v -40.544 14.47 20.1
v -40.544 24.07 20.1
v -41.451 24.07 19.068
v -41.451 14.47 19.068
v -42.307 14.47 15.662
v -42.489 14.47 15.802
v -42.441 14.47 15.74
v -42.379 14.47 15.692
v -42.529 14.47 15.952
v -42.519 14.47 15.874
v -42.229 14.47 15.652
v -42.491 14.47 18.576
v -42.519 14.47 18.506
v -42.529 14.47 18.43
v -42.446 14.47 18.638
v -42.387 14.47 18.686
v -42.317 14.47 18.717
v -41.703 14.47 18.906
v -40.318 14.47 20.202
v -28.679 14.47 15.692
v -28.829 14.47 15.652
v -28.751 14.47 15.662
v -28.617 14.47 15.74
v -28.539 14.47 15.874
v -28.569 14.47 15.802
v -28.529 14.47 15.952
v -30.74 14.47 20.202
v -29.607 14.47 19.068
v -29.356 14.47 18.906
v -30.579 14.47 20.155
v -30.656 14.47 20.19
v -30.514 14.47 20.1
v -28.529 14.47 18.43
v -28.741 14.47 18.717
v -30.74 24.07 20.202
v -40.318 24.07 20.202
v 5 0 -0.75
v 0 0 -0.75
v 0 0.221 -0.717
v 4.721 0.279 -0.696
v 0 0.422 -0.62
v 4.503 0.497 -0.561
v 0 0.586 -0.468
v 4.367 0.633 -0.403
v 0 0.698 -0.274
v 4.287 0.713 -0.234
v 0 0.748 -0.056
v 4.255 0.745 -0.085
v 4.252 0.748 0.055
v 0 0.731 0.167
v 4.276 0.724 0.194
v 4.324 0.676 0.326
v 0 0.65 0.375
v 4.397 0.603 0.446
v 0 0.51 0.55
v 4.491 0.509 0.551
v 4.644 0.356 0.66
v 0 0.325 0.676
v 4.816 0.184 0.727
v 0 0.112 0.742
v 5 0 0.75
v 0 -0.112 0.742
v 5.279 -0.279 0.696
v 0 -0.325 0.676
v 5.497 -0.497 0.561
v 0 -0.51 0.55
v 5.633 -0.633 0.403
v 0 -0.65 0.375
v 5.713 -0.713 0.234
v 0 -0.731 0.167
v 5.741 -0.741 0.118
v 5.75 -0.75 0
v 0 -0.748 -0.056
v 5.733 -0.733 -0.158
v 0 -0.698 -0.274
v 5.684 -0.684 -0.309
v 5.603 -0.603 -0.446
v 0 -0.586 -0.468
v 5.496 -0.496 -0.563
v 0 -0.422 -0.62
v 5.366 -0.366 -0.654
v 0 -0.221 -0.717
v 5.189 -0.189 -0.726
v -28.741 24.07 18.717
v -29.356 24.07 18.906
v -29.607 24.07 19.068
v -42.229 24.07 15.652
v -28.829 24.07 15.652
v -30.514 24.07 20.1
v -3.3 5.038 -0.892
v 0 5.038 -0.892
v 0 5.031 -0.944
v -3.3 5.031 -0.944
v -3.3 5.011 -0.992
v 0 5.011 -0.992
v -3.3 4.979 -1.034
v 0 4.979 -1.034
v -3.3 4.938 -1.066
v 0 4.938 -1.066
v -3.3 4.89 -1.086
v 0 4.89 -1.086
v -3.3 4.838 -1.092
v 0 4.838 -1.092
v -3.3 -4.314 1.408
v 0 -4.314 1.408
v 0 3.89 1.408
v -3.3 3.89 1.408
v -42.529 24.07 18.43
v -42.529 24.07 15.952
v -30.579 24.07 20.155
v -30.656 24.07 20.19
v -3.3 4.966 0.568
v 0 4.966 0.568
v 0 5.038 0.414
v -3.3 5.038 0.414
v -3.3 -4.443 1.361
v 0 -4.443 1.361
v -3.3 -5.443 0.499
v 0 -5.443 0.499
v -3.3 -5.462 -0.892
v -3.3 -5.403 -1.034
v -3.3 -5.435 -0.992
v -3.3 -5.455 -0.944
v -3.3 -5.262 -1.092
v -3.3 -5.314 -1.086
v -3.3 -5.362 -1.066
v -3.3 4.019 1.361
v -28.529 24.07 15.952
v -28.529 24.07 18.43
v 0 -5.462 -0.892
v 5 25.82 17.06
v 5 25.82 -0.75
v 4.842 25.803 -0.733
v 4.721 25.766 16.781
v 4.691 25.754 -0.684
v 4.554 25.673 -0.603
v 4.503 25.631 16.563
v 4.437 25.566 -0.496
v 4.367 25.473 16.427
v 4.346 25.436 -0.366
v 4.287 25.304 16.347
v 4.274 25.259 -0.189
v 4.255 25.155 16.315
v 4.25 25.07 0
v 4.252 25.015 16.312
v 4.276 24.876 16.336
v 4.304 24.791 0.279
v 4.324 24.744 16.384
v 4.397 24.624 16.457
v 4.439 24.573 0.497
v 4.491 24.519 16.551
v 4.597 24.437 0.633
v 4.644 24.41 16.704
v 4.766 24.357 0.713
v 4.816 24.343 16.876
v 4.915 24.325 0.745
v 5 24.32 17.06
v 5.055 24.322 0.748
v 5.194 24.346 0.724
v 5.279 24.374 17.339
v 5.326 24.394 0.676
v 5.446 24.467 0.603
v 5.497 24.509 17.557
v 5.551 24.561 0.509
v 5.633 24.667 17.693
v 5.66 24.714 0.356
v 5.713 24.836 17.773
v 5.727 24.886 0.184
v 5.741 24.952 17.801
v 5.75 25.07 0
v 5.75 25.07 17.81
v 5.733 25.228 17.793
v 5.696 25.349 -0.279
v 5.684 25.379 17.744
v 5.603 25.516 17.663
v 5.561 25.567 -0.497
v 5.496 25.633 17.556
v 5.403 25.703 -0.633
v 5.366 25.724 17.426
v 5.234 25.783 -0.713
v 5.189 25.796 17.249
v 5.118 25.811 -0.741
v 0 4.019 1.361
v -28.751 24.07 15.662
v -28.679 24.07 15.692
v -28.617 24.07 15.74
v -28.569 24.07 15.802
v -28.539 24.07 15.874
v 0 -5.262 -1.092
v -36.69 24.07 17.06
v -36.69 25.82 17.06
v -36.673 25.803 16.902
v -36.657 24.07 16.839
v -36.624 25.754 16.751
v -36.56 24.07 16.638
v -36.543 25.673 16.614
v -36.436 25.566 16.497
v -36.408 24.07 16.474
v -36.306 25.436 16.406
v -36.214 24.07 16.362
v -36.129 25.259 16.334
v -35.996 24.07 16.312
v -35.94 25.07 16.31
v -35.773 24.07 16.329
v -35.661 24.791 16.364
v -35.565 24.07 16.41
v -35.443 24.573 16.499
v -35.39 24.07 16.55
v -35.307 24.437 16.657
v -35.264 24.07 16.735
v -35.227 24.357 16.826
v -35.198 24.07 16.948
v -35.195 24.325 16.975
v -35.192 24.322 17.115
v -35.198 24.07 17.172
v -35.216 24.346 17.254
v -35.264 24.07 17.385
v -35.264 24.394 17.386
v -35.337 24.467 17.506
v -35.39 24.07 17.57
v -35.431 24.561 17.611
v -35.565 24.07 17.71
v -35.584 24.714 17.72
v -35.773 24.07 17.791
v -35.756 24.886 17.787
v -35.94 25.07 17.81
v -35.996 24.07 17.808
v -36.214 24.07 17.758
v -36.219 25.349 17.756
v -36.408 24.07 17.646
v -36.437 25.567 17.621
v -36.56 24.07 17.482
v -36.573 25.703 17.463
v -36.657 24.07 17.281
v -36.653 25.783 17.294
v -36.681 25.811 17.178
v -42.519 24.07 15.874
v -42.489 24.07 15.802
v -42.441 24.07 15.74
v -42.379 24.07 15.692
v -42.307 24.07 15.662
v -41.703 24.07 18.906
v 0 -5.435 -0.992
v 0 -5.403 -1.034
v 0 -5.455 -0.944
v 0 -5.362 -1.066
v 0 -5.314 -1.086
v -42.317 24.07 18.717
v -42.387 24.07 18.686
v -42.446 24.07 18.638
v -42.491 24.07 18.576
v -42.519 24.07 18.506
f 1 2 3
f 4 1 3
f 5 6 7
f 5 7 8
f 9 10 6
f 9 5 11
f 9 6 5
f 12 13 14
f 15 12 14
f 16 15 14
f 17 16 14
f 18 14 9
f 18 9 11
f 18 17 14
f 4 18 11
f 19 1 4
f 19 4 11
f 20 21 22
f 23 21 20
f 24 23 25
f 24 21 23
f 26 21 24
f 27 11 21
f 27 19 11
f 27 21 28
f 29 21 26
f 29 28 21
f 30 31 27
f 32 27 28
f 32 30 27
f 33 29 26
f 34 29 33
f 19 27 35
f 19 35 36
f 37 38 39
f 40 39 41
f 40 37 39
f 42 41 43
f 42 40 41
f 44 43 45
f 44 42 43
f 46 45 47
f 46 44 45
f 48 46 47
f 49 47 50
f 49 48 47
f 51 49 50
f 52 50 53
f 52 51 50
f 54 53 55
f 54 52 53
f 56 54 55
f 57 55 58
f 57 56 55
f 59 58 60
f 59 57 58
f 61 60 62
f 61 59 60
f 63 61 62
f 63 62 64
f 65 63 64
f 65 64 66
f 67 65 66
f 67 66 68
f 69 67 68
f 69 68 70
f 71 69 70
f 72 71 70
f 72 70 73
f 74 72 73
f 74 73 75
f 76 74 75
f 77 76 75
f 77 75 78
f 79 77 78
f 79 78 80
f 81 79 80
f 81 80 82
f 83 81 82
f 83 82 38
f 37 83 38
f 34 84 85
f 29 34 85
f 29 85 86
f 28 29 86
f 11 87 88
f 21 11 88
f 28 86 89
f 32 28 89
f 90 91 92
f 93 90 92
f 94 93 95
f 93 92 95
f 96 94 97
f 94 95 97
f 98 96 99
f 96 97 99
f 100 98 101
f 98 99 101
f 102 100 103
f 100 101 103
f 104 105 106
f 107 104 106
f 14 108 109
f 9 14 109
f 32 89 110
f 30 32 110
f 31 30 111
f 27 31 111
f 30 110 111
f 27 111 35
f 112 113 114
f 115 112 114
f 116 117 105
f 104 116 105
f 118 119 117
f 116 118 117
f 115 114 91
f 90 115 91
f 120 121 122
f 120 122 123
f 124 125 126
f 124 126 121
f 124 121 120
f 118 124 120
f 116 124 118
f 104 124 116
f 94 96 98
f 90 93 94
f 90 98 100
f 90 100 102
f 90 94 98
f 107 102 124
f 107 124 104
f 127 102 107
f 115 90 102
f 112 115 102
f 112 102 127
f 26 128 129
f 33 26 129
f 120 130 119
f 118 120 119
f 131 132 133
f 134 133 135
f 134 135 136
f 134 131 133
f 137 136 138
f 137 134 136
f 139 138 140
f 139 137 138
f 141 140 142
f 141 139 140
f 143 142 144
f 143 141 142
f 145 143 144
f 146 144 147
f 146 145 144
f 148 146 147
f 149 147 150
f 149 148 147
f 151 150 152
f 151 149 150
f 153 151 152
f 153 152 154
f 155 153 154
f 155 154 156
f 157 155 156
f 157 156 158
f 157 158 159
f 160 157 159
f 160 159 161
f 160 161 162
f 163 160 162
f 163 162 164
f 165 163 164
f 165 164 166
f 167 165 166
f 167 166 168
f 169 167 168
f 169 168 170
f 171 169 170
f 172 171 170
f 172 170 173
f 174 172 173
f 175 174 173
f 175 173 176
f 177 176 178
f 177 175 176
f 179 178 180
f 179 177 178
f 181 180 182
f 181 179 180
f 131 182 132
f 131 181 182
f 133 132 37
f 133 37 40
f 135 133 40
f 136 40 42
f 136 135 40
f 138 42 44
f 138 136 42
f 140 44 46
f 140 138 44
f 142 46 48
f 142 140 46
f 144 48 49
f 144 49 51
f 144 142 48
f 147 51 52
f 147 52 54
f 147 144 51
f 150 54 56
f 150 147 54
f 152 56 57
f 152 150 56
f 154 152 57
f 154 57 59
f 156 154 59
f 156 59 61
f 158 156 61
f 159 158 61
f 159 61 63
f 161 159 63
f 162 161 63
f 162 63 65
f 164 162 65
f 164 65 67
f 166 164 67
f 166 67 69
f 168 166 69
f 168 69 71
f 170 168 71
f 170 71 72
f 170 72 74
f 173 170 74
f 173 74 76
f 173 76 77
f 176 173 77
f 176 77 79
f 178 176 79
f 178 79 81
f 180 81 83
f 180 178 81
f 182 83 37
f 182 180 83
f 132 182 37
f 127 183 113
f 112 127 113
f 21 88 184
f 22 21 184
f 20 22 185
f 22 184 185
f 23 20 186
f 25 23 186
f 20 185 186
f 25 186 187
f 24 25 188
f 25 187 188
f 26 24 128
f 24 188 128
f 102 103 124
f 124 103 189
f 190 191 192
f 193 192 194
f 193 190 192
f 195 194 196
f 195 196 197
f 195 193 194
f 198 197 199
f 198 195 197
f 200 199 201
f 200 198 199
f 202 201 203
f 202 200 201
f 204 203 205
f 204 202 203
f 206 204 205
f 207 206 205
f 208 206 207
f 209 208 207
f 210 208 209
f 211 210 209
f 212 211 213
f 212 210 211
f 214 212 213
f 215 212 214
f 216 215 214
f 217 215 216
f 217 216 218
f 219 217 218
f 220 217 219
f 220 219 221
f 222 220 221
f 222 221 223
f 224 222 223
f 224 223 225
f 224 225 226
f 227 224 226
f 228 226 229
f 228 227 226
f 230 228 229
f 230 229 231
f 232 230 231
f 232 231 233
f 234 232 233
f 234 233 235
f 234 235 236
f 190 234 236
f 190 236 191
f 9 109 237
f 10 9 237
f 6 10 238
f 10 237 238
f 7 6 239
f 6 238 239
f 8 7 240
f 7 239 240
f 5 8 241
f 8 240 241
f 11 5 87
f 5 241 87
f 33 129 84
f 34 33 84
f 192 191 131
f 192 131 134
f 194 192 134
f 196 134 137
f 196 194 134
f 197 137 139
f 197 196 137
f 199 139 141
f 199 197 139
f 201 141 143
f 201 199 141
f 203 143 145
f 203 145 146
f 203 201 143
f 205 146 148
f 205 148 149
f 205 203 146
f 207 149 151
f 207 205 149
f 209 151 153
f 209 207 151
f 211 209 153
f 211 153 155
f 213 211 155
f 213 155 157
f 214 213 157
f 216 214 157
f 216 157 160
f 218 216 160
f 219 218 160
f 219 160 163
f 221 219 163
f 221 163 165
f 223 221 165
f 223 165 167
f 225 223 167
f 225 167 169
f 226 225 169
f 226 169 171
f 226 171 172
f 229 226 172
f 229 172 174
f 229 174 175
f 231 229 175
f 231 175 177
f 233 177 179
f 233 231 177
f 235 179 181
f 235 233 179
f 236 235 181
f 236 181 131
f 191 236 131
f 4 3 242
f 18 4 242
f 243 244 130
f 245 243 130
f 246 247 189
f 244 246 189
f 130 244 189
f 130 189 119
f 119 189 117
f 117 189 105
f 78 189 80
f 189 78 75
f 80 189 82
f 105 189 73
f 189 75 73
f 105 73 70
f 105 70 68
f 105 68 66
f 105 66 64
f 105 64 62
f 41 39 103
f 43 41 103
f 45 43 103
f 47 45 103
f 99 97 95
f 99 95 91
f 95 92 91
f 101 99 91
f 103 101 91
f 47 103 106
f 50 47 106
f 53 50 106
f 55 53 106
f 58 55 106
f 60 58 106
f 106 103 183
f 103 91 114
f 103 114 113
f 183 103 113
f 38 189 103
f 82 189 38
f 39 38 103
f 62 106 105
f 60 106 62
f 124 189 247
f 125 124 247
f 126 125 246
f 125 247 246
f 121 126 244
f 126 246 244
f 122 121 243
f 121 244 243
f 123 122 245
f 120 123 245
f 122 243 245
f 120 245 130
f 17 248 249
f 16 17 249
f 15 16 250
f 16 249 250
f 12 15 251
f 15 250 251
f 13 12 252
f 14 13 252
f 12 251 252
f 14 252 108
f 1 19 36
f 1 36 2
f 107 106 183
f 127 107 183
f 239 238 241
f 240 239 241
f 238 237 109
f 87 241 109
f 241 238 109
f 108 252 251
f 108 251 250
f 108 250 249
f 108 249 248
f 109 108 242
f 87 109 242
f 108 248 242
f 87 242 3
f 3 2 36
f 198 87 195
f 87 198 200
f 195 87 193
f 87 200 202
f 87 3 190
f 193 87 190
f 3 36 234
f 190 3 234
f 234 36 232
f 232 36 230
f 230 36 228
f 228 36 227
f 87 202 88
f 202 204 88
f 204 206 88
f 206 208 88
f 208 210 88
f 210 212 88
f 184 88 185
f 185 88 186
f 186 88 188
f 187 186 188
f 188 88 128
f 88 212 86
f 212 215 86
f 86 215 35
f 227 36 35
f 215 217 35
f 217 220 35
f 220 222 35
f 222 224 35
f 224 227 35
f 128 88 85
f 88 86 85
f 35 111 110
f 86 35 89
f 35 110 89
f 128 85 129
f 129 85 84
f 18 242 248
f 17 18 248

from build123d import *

# Parameters (mm, degrees)
ESQUISSE3_R        = 0.75
BOSS_EXTRU_1_DEPTH = 9.6
BOSS_EXTRU_2_DEPTH = 3.3


with BuildPart() as part:
    # Balayage4: sweep along a curve in space
    with BuildLine() as balayage4_path:
        Line((0, 0, 0), (5, 0, 0))
        Line((5, 0, 0), (5, 25.07, 0))
        Line((5, 25.07, 0), (5, 25.07, 17.06))
        Line((5, 25.07, 17.06), (-35.94, 25.07, 17.06))
        Line((-35.94, 25.07, 17.06), (-35.94, 24.07, 17.06))
    # Esquisse3 → Balayage4 (sweep)
    with BuildSketch(Plane(origin=(0, 0, 0), x_dir=(0, 0, -1), z_dir=(1, 0, 0))):
        Circle(ESQUISSE3_R)
    sweep(path=balayage4_path.line, transition=Transition.RIGHT)

    # Esquisse4 → Boss.-Extru.1 (add)
    with BuildSketch(Plane.XZ.offset(-24.07)):
        with BuildLine():
            Line((-28.529069989, 15.951817831), (-28.529069989, 18.430245431))
            Line((-28.529069989, 18.430245431), (-28.740844235, 18.716979133))
            Line((-28.740844235, 18.716979133), (-29.3555682, 18.906124969))
            Line((-29.3555682, 18.906124969), (-29.606713417, 19.068458081))
            Line((-29.606713417, 19.068458081), (-30.514475757, 20.100006195))
            ThreePointArc((-30.514475757, 20.100006195), (-30.616110911, 20.175182519), (-30.739689812, 20.201817826))
            Line((-30.739689812, 20.201817826), (-40.318450167, 20.201817826))
            Line((-40.318450167, 20.201817826), (-40.543664222, 20.100006195))
            Line((-40.543664222, 20.100006195), (-41.451426562, 19.068458081))
            Line((-41.451426562, 19.068458081), (-41.702571779, 18.906124969))
            Line((-41.702571779, 18.906124969), (-42.317295744, 18.716979133))
            ThreePointArc((-42.317295744, 18.716979133), (-42.470386925, 18.608476003), (-42.529069989, 18.430245431))
            Line((-42.529069989, 18.430245431), (-42.529069989, 15.951817831))
            ThreePointArc((-42.529069989, 15.951817831), (-42.441202024, 15.739685796), (-42.229069989, 15.651817831))
            Line((-42.229069989, 15.651817831), (-28.829069989, 15.651817831))
            ThreePointArc((-28.829069989, 15.651817831), (-28.616937955, 15.739685796), (-28.529069989, 15.951817831))
        make_face()
    extrude(amount=BOSS_EXTRU_1_DEPTH)

    # Esquisse5 → Boss.-Extru.2 (add)
    with BuildSketch(Plane.ZY):
        with BuildLine():
            Line((-1.092354738, 4.837960255), (-1.092354738, -5.262039745))
            ThreePointArc((-1.092354738, -5.262039745), (-1.033776094, -5.403461102), (-0.892354738, -5.462039745))
            Line((-0.892354738, -5.462039745), (0.498872789, -5.443254351))
            Line((0.498872789, -5.443254351), (1.360996797, -4.442758746))
            Line((1.360996797, -4.442758746), (1.407645262, -4.314371414))
            Line((1.407645262, -4.314371414), (1.407645262, 3.890291924))
            Line((1.407645262, 3.890291924), (1.360996797, 4.018679255))
            Line((1.360996797, 4.018679255), (0.567600055, 4.966347586))
            Line((0.567600055, 4.966347586), (0.41424852, 5.037960255))
            Line((0.41424852, 5.037960255), (-0.892354738, 5.037960255))
            ThreePointArc((-0.892354738, 5.037960255), (-1.033776094, 4.979381611), (-1.092354738, 4.837960255))
        make_face()
    extrude(amount=BOSS_EXTRU_2_DEPTH)


solid = part.part
